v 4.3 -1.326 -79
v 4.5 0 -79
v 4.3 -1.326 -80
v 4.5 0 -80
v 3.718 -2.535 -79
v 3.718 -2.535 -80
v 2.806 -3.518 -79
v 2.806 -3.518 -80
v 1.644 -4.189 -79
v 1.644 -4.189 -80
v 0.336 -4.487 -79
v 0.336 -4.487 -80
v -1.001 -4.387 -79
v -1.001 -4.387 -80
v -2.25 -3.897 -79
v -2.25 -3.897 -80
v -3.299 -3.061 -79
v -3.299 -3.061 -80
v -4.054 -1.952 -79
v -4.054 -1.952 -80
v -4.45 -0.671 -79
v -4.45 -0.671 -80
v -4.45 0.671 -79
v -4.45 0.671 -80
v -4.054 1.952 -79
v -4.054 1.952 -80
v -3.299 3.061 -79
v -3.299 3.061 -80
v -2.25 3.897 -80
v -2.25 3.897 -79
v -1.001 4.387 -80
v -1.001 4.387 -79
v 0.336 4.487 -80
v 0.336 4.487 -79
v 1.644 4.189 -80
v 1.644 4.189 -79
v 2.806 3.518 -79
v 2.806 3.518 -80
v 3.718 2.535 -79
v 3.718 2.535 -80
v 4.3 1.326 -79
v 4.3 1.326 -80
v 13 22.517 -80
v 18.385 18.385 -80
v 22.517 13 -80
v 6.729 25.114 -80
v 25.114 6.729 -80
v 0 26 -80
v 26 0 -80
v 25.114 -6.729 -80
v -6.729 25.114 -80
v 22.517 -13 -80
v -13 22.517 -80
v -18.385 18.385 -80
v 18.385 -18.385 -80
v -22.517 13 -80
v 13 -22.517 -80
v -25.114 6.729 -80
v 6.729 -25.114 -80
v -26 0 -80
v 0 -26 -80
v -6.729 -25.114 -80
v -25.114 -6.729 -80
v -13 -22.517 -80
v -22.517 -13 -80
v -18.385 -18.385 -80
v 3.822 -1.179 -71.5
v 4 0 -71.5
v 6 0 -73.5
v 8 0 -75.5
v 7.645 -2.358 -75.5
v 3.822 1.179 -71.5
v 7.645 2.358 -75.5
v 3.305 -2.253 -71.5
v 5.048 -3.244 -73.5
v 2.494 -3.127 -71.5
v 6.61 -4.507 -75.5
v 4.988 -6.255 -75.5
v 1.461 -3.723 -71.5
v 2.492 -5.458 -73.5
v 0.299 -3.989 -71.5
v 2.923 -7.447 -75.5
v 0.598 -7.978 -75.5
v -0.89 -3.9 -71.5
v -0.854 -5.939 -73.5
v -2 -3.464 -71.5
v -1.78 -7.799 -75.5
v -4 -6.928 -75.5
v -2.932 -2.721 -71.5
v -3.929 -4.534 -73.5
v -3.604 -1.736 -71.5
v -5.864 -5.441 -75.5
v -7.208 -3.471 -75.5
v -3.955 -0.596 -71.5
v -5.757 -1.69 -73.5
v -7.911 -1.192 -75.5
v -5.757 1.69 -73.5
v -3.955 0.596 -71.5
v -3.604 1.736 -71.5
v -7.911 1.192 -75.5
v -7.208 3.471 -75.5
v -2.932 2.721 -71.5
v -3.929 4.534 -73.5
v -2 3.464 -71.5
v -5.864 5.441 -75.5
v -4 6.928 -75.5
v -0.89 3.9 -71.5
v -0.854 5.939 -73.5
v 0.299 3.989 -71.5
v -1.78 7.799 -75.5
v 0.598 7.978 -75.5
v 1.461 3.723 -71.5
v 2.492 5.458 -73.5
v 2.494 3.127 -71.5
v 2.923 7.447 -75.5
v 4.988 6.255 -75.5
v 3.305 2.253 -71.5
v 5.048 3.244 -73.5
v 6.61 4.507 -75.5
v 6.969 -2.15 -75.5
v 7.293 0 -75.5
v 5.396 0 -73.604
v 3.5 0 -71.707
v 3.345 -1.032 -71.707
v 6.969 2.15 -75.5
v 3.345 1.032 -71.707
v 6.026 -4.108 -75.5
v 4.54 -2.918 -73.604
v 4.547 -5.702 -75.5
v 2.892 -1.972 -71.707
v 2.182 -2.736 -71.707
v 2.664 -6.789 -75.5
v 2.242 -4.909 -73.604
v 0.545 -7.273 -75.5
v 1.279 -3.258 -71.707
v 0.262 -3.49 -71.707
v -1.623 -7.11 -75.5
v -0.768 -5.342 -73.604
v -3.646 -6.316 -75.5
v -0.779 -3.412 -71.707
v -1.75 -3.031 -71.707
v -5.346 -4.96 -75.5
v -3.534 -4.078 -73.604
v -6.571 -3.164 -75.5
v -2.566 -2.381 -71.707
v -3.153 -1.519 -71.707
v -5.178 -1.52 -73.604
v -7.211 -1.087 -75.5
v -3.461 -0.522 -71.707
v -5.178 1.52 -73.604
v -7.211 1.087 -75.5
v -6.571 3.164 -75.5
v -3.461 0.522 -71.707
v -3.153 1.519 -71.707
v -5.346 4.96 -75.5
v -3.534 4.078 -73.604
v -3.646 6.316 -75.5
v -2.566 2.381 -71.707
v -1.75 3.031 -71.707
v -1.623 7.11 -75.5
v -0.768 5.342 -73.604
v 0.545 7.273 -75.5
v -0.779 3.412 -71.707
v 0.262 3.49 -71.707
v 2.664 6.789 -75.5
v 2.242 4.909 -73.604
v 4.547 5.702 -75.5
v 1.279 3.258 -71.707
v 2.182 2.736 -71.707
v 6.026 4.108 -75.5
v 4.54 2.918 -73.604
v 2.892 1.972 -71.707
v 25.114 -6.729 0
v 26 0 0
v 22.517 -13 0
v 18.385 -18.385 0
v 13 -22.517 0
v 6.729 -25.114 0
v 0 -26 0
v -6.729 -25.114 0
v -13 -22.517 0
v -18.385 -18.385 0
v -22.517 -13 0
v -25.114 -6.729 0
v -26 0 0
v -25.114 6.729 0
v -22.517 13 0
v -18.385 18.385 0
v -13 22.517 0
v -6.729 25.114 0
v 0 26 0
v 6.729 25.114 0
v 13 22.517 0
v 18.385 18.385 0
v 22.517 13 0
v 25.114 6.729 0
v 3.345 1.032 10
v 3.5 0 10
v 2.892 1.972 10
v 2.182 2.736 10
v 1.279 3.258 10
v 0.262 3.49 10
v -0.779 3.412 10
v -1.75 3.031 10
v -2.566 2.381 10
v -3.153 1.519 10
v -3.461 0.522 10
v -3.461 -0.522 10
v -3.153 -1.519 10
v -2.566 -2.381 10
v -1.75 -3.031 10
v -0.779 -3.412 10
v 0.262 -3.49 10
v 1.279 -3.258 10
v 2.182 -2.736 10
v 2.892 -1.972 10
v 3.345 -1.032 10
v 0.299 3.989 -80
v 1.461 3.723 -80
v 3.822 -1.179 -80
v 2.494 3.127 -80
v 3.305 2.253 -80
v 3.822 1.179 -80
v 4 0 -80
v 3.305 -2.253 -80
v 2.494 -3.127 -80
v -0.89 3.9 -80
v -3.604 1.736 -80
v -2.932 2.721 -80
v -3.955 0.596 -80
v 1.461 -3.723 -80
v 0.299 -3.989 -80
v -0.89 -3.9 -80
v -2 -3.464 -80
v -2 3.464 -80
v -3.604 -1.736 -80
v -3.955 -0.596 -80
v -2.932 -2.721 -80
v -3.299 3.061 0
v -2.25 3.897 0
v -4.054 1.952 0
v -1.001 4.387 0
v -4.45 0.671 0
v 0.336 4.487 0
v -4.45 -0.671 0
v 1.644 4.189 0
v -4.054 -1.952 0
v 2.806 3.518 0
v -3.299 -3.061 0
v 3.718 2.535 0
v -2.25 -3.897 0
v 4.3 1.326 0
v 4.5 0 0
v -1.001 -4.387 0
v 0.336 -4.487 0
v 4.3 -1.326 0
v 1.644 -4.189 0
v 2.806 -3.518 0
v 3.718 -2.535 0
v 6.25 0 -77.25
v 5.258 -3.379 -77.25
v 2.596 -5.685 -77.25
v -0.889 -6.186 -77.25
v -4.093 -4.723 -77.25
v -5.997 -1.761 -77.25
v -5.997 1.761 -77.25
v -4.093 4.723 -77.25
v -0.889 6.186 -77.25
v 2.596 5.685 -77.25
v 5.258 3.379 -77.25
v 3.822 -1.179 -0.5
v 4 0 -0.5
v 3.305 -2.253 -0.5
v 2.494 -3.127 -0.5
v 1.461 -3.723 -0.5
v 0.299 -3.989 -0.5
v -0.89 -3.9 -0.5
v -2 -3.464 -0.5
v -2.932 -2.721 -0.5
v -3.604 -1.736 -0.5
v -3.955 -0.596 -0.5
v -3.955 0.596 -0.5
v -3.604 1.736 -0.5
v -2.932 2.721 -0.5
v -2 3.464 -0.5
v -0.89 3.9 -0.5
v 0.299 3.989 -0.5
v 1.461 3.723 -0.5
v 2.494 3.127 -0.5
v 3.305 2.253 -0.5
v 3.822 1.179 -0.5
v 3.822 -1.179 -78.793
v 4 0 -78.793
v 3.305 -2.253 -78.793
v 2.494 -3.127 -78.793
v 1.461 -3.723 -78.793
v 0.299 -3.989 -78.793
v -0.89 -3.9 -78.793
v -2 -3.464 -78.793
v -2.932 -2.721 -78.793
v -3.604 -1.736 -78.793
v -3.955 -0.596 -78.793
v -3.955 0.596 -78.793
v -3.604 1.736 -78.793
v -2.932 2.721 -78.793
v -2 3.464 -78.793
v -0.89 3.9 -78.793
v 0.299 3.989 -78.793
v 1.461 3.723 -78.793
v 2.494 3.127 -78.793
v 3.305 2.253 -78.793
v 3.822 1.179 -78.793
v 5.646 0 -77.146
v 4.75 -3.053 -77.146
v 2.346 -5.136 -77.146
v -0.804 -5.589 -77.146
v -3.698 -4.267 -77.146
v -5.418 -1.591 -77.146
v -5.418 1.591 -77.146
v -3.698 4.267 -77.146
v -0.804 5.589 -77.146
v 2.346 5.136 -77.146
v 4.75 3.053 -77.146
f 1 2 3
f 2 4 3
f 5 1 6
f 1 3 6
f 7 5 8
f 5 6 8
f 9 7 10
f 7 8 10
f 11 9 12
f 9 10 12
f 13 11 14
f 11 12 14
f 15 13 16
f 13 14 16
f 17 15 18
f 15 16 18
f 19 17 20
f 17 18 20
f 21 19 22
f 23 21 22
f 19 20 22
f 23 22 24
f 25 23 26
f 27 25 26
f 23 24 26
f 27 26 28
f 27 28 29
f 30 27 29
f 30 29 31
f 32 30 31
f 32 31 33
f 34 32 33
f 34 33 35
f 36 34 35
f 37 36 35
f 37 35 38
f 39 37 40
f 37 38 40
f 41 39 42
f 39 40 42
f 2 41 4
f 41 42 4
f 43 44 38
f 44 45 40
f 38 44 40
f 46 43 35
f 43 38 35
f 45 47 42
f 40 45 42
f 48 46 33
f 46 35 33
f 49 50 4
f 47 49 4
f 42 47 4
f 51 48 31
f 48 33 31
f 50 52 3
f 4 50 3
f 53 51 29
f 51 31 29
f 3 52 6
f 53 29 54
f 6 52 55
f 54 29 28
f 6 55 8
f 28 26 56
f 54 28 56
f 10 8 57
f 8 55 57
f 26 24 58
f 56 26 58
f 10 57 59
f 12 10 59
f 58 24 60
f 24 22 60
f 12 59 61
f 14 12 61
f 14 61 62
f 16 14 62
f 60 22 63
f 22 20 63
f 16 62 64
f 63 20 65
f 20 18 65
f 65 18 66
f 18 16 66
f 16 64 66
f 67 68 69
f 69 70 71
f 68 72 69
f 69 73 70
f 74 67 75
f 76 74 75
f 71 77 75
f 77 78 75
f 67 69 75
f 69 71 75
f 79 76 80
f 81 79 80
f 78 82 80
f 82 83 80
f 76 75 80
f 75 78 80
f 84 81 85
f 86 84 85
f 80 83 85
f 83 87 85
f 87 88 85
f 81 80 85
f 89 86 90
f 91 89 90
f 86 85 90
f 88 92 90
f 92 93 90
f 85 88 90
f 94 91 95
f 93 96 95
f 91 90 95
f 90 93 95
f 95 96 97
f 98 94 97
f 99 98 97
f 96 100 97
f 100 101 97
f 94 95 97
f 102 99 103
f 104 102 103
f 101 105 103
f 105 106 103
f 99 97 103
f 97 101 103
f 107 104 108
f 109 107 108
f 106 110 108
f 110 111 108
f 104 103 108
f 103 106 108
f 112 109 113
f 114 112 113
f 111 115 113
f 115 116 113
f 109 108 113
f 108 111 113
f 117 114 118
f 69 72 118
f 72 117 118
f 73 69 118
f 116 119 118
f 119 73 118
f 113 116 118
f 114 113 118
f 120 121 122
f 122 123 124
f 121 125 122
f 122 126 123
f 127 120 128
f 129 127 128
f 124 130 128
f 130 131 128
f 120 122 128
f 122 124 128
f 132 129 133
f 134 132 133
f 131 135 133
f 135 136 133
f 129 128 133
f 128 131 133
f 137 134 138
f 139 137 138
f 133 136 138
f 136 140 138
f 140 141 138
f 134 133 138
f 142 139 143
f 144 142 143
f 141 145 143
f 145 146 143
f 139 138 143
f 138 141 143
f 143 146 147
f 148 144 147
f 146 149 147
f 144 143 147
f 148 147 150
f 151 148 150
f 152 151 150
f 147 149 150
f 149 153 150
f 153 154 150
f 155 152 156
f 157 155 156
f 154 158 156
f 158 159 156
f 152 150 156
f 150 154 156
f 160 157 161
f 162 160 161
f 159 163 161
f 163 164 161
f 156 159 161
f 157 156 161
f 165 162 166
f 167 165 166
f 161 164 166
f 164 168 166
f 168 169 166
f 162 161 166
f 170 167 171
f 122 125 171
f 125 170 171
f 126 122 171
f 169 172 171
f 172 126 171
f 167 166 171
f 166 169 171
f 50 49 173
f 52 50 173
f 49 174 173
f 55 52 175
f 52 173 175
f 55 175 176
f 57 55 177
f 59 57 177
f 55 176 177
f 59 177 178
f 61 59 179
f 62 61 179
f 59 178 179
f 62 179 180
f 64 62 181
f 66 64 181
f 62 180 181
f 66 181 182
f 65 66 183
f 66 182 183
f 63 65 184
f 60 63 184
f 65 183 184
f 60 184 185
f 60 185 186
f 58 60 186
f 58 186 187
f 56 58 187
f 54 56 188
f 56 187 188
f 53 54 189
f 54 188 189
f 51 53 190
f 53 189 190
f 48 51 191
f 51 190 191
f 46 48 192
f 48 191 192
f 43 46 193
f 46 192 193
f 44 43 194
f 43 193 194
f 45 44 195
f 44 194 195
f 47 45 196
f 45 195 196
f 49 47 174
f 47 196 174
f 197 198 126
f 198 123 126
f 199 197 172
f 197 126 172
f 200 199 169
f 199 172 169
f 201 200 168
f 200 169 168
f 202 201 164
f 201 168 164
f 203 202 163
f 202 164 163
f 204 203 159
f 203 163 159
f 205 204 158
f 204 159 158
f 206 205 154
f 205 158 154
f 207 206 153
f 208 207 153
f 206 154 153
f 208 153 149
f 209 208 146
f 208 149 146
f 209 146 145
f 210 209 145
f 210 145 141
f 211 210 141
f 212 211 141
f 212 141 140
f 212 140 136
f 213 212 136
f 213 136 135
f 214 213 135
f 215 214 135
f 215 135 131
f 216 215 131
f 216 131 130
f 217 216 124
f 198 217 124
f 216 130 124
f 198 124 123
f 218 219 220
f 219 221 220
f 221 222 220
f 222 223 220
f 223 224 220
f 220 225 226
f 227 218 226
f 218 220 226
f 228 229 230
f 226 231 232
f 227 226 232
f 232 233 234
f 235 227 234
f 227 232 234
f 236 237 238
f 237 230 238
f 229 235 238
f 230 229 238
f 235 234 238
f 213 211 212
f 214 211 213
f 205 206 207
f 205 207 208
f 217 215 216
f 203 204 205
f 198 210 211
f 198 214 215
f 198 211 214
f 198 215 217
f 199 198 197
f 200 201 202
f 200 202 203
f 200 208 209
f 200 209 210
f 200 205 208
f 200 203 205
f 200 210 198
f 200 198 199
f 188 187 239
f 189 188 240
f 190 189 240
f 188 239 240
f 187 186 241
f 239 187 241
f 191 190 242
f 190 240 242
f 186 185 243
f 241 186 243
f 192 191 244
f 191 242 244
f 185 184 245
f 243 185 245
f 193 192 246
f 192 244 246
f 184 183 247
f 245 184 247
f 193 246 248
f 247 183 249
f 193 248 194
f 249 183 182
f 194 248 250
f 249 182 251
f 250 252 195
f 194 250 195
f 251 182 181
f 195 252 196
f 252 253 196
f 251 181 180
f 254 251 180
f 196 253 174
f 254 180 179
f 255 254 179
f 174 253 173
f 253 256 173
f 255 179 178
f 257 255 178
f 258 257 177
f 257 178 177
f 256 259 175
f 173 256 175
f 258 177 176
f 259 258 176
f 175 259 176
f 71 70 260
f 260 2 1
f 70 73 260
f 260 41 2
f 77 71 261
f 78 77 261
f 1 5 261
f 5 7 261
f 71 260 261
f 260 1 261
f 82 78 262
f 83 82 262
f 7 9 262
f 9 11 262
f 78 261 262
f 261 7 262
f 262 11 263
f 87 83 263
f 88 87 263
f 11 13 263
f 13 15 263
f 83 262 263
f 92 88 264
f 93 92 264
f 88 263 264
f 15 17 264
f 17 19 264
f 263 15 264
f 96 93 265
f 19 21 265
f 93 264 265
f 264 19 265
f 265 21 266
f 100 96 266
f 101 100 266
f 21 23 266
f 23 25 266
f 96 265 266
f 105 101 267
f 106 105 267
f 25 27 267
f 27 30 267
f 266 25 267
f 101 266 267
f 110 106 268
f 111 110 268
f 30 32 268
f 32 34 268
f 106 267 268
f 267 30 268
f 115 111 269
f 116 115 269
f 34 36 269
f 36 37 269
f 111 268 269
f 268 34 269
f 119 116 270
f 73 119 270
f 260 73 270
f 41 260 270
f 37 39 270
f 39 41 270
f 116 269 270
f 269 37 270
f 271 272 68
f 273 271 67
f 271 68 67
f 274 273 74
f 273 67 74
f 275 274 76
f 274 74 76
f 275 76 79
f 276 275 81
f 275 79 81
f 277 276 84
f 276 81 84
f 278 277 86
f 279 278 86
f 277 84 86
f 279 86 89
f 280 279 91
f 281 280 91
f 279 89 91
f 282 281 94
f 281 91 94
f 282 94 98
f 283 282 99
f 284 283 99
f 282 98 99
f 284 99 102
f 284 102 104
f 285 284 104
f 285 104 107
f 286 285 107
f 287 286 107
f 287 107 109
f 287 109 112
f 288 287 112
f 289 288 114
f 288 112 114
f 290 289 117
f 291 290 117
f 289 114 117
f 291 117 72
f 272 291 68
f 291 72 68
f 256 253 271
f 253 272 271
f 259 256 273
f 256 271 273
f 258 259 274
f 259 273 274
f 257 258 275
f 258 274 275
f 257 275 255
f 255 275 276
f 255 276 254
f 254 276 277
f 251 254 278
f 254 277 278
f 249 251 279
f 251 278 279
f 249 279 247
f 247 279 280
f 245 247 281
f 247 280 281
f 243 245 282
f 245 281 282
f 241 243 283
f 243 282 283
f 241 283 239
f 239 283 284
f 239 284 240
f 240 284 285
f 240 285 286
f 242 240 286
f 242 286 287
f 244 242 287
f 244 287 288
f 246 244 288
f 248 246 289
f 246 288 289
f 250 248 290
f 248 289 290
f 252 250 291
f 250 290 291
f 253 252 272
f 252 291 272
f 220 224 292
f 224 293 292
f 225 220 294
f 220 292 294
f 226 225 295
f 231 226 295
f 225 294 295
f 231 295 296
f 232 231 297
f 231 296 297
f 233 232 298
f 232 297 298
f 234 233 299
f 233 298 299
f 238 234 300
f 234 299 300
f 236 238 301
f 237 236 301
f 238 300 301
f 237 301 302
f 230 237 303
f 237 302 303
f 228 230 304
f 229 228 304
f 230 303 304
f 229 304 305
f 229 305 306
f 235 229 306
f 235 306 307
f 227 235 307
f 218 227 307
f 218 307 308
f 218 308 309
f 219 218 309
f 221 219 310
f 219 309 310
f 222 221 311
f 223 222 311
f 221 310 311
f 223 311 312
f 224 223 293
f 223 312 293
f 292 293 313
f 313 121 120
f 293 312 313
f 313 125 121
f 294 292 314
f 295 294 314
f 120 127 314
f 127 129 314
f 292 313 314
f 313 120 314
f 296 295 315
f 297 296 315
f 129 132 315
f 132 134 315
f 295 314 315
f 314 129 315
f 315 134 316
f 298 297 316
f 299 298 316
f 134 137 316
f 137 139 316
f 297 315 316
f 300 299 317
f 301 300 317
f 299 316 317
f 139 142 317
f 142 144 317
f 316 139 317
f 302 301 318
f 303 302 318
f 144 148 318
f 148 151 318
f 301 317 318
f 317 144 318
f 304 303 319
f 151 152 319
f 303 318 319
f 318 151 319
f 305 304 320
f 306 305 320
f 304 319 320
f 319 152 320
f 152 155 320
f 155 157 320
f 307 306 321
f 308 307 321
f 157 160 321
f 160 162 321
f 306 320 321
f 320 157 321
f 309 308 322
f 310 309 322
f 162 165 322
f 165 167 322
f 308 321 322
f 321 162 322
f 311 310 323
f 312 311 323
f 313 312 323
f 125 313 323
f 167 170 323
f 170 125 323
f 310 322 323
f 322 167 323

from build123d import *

# Parameters (mm, degrees)
F3_FACE_R = 3.5
F4_DEPTH  = 10


with BuildPart() as f2:
    # F0 (on Front) → F2 (revolve)
    with BuildSketch(Plane.XZ):
        Polygon((26, 0), (4.5, 0), (4, -0.5), (4, -71.5), (8, -75.5), (7, -76.5), (4.5, -79), (4.5, -80), (26, -80), align=None)
    revolve(axis=Axis((0, 0, -40), (0, 0, -1)))


with BuildPart() as f3:
    # F1 (on Front) → F3 (revolve)
    with BuildSketch(Plane.XZ):
        Polygon((3.5, -71.707107), (3.5, -0.292893), (3.5, 0), (0, 0), (0, -80), (4, -80), (4, -78.792893), (7.292893, -75.5), align=None)
    revolve(axis=Axis((0, 0, -40), (0, 0, -1)))

    # F3_face (on face) → F4 (join)
    with BuildSketch(Plane.XY):
        Circle(F3_FACE_R)
    extrude(amount=F4_DEPTH)


solid = Compound([f2.part, f3.part])
